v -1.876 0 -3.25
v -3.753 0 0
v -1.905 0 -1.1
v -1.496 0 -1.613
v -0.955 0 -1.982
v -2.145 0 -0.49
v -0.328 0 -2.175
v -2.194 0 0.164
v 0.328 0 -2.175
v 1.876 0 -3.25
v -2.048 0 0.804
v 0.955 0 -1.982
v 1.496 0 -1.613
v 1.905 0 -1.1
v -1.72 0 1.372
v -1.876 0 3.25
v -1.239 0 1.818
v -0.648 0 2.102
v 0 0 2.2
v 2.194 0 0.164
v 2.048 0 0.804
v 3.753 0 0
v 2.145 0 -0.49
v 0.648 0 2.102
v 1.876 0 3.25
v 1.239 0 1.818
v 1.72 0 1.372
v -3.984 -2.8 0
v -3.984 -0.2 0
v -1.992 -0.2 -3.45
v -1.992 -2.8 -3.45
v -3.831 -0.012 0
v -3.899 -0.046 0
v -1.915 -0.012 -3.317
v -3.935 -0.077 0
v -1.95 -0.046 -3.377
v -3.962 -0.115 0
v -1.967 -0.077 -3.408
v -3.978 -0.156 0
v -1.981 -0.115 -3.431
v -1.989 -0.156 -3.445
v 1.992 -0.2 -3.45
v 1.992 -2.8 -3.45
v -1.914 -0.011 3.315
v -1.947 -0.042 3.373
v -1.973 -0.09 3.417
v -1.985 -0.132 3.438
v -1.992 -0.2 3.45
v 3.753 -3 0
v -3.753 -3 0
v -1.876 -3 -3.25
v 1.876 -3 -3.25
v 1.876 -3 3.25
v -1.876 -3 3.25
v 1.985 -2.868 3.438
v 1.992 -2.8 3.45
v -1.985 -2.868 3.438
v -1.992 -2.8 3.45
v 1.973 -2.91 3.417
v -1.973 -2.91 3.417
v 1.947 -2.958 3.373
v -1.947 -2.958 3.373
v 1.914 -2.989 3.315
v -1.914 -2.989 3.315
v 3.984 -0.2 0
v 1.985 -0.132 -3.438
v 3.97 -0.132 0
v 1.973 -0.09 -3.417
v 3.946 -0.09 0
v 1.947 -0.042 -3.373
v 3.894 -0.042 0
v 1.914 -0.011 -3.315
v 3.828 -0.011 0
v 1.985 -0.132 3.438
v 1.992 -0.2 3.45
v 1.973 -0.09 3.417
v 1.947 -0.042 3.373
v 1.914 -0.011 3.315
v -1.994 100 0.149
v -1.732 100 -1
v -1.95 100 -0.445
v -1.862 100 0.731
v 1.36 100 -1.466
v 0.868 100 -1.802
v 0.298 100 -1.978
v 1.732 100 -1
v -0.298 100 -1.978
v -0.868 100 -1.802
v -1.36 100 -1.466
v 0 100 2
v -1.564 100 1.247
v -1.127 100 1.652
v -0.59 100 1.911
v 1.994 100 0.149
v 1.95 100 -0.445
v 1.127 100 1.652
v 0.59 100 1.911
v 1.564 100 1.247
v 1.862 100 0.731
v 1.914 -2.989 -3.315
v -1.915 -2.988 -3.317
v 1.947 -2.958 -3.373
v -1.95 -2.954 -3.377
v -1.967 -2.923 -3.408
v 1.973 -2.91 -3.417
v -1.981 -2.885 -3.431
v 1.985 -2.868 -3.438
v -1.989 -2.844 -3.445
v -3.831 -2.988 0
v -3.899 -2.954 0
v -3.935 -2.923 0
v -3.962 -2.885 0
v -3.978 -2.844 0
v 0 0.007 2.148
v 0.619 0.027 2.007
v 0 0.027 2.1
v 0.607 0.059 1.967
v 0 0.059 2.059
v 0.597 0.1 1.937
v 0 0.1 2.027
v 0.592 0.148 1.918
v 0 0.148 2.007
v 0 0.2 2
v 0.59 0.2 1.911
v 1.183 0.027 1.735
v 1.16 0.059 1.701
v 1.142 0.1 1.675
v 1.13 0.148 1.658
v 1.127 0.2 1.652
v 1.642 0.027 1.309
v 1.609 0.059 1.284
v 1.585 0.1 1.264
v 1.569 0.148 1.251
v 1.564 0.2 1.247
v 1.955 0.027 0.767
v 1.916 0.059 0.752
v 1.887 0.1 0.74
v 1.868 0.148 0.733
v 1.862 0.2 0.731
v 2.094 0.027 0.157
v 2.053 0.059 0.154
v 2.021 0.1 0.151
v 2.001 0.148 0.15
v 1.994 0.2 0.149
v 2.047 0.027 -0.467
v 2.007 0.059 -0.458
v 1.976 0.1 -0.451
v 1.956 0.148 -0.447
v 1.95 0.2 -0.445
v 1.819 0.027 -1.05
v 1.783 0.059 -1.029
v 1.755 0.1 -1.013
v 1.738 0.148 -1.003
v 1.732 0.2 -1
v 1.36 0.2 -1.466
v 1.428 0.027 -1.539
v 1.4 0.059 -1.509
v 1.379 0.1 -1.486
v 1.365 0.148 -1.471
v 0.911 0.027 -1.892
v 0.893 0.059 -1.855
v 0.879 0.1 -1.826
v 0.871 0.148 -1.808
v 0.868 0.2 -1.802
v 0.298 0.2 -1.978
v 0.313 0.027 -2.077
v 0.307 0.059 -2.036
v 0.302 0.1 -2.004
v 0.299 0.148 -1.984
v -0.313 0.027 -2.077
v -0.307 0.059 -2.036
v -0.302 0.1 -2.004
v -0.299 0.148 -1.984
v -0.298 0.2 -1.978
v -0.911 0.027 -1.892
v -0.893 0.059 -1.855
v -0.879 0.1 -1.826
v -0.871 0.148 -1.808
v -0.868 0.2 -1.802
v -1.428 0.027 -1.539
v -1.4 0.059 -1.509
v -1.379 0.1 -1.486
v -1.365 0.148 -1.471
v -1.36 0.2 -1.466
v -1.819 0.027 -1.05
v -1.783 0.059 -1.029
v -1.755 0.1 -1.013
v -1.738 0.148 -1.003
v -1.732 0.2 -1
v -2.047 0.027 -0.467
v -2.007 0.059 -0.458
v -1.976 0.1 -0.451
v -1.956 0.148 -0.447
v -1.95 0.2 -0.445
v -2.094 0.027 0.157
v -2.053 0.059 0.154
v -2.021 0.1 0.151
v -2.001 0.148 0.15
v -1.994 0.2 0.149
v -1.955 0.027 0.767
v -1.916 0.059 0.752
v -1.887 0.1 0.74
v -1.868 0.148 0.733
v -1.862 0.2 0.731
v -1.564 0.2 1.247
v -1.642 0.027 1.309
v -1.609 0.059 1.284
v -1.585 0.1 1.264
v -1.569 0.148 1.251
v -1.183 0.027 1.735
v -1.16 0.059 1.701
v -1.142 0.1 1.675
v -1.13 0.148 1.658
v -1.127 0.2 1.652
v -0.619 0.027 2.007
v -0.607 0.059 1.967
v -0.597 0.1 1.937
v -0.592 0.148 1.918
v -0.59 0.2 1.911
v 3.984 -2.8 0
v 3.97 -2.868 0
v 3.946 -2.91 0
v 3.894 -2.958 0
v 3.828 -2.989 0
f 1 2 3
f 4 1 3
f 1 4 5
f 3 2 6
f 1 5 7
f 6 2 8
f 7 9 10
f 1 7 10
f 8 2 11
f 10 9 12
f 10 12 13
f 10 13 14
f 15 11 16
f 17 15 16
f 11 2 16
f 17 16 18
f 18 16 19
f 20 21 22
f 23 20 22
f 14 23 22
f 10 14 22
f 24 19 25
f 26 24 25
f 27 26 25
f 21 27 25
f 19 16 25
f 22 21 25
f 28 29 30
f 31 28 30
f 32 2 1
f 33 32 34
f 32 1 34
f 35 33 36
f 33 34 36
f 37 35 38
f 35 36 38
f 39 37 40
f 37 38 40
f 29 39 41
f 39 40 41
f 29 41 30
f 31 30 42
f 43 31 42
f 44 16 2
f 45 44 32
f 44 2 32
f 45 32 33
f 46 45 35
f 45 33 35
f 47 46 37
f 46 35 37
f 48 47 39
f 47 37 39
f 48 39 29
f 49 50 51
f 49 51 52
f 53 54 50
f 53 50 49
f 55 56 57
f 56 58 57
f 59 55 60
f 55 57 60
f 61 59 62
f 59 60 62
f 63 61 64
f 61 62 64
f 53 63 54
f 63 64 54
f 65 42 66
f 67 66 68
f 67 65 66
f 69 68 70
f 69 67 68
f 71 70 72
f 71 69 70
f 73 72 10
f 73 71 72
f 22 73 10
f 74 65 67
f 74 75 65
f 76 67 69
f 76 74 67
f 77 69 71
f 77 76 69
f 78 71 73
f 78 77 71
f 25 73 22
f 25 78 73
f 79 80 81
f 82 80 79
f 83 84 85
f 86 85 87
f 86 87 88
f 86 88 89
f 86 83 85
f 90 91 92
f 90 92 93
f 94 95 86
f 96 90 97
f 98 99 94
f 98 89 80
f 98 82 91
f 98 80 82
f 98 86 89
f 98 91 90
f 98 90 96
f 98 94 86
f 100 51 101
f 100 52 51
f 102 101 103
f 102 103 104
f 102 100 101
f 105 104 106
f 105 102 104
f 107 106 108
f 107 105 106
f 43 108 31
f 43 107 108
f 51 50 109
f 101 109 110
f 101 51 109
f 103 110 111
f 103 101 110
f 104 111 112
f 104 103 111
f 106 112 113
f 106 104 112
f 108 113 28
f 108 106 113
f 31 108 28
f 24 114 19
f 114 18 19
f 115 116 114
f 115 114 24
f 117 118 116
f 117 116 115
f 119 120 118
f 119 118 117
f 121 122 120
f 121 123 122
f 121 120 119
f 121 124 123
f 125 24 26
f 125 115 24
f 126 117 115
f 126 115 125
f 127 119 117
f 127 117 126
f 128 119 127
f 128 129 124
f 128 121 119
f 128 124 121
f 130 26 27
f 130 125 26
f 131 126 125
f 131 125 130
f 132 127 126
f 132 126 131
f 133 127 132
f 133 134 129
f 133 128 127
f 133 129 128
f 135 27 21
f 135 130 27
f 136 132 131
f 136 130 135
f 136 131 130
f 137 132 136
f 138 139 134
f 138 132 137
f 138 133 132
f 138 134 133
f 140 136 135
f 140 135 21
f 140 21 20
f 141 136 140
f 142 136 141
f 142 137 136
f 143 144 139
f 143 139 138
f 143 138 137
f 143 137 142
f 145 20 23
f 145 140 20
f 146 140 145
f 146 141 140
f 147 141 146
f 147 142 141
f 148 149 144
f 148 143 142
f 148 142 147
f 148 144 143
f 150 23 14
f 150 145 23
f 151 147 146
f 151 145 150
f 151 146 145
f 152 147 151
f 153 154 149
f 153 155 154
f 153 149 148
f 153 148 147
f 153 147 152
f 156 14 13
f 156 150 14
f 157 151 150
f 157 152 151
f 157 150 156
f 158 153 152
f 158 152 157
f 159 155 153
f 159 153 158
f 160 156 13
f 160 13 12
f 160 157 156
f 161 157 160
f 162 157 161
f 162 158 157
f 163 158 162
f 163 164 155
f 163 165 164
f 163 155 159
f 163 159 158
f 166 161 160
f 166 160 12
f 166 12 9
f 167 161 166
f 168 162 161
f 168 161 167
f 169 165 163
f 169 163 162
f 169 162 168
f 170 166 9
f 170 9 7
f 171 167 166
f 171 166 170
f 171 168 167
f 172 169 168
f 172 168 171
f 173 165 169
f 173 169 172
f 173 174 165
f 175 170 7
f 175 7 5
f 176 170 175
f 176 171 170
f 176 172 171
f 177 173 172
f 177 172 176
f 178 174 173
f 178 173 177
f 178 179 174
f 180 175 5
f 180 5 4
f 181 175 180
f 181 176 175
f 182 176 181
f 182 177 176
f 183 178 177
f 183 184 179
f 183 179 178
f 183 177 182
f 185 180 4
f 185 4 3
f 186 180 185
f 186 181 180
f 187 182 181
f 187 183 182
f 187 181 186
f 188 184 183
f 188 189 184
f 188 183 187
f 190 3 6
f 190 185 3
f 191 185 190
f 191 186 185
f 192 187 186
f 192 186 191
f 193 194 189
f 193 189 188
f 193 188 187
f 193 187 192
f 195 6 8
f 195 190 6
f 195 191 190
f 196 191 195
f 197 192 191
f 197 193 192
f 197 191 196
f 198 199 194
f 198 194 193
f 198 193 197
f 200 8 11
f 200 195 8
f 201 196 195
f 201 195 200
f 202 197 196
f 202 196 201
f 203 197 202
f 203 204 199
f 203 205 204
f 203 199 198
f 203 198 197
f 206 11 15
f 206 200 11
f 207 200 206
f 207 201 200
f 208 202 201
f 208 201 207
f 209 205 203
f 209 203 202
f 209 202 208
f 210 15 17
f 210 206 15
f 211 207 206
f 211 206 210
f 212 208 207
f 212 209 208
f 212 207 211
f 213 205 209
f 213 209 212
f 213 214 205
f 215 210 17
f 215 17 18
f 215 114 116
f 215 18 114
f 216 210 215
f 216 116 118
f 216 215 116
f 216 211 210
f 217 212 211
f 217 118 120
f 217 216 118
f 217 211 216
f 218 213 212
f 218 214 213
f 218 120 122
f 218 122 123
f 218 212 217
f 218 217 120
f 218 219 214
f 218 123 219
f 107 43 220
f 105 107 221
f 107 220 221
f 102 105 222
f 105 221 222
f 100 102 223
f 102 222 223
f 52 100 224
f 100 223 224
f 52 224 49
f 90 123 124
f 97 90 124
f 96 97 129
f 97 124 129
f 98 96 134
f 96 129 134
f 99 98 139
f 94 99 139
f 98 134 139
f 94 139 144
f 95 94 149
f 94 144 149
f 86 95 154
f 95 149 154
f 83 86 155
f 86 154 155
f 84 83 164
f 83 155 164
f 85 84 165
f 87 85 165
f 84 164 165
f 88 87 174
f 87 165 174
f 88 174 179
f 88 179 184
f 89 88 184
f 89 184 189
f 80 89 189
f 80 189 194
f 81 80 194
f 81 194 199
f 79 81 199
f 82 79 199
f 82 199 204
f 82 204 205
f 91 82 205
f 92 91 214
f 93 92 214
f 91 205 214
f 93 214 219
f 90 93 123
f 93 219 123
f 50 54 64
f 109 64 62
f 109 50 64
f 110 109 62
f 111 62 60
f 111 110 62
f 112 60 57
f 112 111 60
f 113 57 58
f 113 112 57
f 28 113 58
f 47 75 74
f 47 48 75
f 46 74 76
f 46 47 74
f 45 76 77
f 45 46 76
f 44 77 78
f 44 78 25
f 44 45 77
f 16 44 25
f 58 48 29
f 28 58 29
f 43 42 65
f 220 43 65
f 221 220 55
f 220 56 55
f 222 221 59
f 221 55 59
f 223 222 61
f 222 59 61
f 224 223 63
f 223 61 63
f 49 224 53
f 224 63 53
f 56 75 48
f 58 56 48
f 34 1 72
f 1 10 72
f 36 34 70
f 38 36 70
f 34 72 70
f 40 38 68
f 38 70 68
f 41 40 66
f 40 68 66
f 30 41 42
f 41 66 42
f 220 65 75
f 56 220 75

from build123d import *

# Parameters (mm, degrees)
SKETCH1_R           = 2
BOSS_EXTRUDE1_DEPTH = 100
BOSS_EXTRUDE2_DEPTH = 3
FILLET2_R           = 0.2


with BuildPart() as part:
    # Sketch1 → Boss-Extrude1 (new body)
    with BuildSketch(Plane(origin=(0, 0, 0), x_dir=(1, 0, 0), z_dir=(0, 1, 0))):
        with Locations(Location((0, 0, 0), (0, 0, 270))):
            Circle(SKETCH1_R)
    extrude(amount=BOSS_EXTRUDE1_DEPTH)

    # Sketch2 → Boss-Extrude2 (add)
    with BuildSketch(Plane.XZ):
        Polygon((3.983716857, 0), (1.991858429, 3.45), (-1.991858429, 3.45), (-3.983716857, 0), (-1.991858429, -3.45), (1.991858429, -3.45), align=None)
    extrude(amount=BOSS_EXTRUDE2_DEPTH)

    # Fillet2
    fillet2_edges = [part.edges().sort_by_distance(p)[0] for p in [
        (0, 0, -2),
        (2.987787643, 0, -1.725),
        (2.987787643, 0, 1.725),
        (0, 0, 3.45),
        (-2.987787643, 0, 1.725),
        (-2.987787643, 0, -1.725),
        (0, 0, -3.45),
        (2.987787643, -3, -1.725),
        (2.987787643, -3, 1.725),
        (0, -3, 3.45),
        (-2.987787643, -3, 1.725),
        (-2.987787643, -3, -1.725),
        (0, -3, -3.45),
    ]]
    fillet(fillet2_edges, radius=FILLET2_R)


solid = part.part
